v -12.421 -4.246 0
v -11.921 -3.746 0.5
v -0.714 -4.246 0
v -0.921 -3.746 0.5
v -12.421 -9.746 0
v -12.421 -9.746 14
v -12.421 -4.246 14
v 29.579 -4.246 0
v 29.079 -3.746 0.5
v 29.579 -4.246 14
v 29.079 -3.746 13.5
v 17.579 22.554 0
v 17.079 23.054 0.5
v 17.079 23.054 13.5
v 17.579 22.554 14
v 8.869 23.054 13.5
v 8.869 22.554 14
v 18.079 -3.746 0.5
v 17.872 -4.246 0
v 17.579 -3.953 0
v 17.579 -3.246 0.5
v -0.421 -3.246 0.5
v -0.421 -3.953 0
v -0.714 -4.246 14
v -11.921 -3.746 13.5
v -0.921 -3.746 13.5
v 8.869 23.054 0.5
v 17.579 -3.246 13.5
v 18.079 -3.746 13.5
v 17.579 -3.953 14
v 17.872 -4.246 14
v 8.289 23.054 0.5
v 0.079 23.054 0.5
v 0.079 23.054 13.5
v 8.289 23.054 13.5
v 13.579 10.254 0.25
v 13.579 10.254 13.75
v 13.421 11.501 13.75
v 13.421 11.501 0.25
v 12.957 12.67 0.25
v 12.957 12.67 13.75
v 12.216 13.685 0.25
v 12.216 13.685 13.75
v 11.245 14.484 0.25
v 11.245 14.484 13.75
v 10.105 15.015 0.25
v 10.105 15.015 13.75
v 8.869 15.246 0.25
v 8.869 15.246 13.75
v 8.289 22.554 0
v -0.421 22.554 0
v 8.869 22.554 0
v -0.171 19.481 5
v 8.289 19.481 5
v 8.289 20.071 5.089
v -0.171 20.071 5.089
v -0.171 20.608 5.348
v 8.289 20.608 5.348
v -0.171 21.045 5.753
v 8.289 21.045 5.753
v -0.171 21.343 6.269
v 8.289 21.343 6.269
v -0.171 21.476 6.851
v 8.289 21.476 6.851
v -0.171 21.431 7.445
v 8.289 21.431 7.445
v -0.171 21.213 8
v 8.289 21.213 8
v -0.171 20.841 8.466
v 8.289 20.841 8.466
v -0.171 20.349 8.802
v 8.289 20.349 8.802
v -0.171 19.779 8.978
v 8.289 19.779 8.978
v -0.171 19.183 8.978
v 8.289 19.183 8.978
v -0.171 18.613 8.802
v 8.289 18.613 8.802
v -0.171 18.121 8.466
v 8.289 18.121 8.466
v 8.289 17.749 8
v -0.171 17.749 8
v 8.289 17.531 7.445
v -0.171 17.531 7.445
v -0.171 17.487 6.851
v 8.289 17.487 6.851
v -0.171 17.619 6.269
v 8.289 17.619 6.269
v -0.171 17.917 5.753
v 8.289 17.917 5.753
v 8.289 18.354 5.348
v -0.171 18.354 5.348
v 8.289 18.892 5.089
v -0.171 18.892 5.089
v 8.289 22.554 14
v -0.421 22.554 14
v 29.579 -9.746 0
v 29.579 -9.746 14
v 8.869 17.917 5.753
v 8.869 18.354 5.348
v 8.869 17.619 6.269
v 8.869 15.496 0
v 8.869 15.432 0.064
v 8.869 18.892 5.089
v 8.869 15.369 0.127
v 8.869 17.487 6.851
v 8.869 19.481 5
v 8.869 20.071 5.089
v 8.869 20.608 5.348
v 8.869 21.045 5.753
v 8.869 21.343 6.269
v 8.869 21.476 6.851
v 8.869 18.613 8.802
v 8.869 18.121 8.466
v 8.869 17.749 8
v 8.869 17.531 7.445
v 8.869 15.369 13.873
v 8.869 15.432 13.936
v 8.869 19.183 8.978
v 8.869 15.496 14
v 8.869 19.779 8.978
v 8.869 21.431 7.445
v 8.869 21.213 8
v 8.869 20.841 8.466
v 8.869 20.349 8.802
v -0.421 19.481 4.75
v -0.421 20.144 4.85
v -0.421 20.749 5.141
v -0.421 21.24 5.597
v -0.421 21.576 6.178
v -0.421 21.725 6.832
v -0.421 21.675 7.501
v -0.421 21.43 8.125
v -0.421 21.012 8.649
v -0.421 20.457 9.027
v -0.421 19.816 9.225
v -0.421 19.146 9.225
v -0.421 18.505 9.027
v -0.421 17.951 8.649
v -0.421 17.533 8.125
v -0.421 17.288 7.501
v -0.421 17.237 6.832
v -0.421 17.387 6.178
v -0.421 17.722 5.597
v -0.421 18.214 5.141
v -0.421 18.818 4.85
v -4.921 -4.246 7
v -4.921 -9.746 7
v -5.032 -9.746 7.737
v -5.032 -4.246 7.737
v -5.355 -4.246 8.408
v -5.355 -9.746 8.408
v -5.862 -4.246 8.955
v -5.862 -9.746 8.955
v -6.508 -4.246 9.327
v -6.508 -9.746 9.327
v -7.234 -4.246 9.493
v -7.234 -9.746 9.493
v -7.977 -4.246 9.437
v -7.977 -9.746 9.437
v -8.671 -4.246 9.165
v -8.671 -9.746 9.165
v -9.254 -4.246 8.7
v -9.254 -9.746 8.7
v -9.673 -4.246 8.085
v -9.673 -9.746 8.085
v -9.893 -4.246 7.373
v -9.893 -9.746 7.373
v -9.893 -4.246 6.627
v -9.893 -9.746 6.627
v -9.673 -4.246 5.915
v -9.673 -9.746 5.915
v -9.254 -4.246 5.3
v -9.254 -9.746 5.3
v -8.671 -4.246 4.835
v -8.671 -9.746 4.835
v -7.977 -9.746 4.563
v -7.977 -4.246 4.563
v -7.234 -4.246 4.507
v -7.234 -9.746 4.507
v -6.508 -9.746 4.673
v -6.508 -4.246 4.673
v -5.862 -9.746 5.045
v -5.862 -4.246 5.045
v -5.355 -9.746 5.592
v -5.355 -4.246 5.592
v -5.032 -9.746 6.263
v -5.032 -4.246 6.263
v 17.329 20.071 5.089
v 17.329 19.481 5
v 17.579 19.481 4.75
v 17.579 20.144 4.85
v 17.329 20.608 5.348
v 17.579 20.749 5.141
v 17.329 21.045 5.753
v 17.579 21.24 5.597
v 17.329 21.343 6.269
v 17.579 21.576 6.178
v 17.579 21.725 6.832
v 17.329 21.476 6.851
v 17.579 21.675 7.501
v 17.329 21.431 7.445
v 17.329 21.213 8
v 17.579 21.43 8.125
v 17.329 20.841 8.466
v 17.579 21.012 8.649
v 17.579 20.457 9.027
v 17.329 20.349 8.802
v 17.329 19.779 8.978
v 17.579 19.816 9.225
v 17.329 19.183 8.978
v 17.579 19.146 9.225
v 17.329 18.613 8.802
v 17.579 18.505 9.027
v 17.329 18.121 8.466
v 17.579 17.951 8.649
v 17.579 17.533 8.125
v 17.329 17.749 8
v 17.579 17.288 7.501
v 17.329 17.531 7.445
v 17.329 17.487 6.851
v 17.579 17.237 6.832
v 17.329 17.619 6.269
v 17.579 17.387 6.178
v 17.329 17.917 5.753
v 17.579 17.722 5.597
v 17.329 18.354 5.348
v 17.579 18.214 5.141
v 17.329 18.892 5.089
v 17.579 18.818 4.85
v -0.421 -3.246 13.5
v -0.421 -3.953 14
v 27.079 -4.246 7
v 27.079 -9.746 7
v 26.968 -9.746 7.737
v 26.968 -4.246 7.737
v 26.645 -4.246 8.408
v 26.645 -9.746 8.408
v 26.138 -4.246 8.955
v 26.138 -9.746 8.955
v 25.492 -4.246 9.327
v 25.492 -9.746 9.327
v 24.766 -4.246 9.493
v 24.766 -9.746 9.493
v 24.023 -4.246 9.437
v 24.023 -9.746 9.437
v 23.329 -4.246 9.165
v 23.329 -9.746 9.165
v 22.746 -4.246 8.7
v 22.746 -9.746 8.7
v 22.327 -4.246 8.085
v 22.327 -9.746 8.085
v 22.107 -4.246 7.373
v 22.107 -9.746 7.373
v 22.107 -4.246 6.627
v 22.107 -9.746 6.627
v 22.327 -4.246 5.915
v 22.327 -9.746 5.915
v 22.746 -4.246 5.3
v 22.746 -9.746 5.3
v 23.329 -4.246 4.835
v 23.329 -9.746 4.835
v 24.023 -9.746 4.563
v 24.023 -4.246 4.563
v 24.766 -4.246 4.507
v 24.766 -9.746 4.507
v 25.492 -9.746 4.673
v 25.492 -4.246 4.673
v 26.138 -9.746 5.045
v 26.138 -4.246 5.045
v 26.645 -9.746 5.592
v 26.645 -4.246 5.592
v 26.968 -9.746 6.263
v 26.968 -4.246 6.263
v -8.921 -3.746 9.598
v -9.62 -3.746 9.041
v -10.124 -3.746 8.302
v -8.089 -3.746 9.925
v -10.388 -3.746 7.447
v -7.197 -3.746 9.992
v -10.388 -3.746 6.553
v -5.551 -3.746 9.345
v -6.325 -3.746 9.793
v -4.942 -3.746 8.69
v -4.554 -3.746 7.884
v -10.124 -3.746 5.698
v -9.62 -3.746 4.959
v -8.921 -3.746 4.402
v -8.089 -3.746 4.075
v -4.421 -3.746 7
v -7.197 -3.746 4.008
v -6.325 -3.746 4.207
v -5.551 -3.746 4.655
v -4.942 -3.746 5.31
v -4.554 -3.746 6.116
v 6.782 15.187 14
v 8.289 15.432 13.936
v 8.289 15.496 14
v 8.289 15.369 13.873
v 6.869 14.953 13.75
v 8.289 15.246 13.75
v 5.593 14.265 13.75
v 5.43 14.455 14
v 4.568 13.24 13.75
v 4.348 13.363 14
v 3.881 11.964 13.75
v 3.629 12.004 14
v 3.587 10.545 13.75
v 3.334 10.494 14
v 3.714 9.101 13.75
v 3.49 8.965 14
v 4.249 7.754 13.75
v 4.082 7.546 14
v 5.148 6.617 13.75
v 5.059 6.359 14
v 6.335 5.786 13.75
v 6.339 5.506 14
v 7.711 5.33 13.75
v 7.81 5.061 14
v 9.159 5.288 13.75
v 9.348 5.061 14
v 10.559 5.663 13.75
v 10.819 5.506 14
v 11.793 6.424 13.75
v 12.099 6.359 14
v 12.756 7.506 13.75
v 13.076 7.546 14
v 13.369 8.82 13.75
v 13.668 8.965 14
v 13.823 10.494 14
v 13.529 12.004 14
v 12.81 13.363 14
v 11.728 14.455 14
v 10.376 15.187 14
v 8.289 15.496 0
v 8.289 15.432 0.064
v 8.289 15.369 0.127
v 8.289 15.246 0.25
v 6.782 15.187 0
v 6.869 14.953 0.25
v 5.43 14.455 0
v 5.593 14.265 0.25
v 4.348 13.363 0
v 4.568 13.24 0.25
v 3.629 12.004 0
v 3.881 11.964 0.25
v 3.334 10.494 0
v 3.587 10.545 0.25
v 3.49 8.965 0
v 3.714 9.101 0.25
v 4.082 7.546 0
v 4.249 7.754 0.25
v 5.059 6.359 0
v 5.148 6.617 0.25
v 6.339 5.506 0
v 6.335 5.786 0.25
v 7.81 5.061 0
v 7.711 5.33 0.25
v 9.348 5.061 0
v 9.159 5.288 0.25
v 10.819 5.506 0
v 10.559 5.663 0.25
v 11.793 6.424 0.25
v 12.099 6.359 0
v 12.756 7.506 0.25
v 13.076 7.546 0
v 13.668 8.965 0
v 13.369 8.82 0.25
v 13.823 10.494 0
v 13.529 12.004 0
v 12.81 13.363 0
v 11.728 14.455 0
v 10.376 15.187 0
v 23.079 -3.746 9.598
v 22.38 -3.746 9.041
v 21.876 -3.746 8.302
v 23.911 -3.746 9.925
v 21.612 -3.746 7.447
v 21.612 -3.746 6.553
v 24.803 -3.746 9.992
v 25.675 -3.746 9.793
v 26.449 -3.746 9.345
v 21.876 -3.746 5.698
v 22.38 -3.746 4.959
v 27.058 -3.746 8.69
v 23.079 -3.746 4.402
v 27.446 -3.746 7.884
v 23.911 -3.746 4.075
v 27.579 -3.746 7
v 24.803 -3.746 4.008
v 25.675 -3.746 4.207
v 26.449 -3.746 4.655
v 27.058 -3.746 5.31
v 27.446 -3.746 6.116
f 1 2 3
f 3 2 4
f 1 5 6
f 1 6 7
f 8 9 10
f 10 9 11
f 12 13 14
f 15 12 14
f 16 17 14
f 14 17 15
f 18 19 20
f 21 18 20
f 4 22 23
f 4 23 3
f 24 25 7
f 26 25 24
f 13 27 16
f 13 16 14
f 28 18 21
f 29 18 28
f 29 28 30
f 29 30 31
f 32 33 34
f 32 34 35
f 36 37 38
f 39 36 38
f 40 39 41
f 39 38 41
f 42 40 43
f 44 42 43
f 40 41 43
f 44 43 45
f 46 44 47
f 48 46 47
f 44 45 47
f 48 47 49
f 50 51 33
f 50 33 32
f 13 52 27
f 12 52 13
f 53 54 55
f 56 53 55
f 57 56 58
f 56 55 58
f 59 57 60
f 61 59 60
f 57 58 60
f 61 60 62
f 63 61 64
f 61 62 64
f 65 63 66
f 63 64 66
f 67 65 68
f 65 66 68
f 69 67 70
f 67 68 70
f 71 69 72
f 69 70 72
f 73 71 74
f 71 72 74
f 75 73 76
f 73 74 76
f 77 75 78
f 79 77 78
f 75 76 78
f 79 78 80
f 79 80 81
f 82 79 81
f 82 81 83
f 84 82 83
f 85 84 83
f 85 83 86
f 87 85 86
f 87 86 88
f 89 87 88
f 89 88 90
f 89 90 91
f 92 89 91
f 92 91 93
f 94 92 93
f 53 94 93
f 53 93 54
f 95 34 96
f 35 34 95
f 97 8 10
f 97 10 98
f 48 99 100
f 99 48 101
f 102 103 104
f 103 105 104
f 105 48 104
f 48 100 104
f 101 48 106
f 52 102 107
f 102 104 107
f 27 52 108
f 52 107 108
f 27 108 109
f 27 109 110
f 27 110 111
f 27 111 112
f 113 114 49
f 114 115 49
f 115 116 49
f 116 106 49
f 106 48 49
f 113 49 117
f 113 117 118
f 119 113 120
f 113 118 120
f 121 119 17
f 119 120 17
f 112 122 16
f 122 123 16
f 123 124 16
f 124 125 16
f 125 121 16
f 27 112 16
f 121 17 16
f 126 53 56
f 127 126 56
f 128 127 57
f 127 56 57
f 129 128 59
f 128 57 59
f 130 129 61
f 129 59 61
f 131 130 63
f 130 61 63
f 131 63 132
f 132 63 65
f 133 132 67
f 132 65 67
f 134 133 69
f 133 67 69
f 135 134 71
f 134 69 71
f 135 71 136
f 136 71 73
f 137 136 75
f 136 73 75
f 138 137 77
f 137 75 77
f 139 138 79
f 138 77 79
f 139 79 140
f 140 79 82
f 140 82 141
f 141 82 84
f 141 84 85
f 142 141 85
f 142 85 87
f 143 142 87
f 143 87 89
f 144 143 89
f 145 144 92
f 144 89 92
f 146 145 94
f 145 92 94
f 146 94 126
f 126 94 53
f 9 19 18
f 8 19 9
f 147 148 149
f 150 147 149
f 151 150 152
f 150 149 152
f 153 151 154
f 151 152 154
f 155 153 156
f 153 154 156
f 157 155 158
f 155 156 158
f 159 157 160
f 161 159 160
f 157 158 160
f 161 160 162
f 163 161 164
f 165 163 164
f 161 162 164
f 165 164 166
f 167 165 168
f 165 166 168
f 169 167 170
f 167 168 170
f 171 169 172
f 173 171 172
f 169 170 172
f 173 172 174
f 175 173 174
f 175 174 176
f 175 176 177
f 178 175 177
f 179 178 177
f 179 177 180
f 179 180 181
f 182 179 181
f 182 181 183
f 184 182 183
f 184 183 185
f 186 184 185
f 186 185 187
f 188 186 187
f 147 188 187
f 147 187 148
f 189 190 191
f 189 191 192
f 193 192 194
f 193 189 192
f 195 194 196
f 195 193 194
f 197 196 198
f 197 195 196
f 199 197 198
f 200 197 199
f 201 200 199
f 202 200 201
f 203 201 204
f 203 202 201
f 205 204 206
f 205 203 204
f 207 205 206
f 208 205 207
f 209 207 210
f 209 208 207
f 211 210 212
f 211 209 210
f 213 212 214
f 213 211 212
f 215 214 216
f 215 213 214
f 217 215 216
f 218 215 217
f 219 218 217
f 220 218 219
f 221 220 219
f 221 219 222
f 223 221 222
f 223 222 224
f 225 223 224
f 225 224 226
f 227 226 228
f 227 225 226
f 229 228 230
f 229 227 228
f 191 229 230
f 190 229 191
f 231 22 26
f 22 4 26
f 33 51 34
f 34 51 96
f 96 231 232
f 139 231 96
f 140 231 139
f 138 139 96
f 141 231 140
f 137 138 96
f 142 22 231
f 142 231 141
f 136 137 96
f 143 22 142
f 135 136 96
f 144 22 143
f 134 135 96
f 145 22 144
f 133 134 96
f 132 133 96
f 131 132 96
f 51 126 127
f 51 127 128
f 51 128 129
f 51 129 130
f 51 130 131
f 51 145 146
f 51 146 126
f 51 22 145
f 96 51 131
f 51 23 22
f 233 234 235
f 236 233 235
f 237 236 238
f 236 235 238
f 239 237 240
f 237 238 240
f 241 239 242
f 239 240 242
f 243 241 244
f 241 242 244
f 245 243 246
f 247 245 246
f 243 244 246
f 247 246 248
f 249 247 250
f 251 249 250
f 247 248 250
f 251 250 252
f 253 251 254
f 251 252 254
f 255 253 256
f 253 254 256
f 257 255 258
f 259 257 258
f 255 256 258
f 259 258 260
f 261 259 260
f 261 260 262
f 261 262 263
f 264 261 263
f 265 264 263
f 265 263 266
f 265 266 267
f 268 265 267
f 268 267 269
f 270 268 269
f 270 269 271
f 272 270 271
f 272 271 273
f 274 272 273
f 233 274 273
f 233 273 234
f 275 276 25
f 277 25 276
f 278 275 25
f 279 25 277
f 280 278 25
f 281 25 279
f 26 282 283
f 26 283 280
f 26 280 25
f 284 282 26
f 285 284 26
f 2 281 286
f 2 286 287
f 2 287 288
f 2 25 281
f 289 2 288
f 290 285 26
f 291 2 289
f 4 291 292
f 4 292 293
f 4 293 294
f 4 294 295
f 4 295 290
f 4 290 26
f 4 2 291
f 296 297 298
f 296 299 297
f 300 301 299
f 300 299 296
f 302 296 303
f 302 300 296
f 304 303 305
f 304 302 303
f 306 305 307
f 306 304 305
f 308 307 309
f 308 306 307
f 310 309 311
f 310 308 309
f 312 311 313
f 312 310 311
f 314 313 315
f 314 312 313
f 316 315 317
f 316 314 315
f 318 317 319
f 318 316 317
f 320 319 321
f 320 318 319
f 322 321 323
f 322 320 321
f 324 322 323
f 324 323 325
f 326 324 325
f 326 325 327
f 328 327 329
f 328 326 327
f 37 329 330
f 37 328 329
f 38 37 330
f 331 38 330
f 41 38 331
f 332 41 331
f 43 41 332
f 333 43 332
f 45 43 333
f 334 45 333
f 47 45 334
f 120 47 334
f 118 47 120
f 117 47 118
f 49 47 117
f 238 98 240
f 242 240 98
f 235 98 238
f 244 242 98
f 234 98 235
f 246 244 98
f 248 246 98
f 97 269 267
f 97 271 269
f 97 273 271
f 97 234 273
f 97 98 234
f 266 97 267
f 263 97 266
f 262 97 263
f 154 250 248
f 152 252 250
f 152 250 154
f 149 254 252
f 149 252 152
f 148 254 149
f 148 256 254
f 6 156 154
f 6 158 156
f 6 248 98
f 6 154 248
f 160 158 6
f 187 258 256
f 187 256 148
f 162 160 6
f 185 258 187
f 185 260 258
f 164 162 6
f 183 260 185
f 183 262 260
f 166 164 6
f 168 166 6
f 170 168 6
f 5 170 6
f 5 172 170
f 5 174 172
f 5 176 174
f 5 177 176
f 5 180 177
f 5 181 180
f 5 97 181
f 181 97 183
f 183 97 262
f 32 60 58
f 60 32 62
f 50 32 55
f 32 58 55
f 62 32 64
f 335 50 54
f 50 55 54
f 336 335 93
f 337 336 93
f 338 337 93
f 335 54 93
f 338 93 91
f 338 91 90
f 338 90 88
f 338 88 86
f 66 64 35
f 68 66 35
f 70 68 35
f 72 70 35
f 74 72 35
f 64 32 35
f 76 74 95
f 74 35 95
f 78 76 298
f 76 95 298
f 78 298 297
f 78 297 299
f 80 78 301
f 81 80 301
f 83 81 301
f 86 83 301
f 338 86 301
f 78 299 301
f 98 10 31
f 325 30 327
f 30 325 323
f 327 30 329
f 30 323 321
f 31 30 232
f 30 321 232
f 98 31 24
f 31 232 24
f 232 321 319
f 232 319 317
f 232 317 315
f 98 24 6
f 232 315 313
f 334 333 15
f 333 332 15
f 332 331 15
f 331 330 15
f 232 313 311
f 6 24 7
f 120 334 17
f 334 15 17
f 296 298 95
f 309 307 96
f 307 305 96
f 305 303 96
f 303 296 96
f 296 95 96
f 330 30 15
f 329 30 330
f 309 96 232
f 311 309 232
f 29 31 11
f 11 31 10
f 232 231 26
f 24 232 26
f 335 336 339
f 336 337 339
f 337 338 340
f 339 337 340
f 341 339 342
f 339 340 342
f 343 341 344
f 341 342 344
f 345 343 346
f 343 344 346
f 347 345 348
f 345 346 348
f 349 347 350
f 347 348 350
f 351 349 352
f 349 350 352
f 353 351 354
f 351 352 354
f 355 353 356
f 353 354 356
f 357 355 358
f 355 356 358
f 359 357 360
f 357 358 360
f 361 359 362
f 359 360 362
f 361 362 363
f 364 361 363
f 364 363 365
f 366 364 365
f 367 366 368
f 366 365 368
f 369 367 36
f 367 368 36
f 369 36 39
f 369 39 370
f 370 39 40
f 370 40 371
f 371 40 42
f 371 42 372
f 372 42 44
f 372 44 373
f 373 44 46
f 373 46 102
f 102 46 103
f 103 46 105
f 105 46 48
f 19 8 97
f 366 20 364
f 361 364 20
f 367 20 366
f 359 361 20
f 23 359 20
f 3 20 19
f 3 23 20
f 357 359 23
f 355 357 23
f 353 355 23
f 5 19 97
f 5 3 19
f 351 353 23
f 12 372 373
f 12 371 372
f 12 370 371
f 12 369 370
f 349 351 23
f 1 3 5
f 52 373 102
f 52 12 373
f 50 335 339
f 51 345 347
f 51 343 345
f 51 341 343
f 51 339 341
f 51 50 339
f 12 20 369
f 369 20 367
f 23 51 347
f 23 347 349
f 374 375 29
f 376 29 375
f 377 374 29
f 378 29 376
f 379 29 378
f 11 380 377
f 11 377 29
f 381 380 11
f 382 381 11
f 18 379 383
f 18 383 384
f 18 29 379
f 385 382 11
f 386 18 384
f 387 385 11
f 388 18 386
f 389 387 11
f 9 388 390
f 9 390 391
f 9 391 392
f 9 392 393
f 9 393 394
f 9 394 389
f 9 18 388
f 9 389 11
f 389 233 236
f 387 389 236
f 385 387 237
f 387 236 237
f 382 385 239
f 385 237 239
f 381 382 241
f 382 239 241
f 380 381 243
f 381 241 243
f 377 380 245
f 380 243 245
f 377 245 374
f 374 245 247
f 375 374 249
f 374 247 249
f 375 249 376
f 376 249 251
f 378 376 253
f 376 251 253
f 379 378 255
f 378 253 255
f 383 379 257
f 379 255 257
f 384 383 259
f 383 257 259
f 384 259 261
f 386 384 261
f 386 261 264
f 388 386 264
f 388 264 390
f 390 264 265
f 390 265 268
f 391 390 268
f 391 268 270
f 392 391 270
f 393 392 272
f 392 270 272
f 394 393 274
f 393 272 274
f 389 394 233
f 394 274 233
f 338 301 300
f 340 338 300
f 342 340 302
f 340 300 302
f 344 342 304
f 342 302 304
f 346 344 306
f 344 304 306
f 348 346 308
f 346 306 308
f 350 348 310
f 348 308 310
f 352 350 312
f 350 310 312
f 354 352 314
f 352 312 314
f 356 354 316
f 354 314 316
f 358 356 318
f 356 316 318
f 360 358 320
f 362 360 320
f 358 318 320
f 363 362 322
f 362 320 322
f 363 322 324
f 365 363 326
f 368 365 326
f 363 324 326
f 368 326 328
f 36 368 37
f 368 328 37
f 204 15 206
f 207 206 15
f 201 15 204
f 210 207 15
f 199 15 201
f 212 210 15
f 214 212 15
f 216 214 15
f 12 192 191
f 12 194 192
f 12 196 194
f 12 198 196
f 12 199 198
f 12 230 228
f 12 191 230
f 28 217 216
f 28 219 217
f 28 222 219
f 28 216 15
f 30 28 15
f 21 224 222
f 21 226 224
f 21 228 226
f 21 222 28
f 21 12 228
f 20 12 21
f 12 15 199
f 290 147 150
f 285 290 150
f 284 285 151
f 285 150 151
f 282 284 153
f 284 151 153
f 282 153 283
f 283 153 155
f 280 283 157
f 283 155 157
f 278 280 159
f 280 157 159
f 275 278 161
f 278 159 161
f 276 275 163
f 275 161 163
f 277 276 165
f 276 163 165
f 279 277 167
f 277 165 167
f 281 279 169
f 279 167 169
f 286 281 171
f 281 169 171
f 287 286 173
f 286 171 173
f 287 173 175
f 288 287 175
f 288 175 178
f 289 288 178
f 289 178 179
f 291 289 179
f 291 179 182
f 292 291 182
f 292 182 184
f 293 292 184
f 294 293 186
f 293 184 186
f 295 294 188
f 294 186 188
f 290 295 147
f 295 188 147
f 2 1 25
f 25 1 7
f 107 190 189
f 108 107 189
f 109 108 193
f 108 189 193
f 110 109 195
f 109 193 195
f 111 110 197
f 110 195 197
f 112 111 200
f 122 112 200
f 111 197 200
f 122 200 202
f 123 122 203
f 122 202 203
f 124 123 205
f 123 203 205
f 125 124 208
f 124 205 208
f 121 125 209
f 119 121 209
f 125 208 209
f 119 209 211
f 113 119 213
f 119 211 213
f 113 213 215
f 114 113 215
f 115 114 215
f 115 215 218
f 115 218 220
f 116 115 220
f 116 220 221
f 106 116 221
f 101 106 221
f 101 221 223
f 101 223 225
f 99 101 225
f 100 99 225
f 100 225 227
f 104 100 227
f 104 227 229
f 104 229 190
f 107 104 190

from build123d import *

# Parameters (mm, degrees)
BOSS_EXTRUDE1_DEPTH = 14
CHAMFER1_SIZE       = 0.5
CHAMFER2_SIZE       = 0.5
CHAMFER3_SIZE       = 0.5
CHAMFER4_SIZE       = 0.5
CHAMFER5_SIZE       = 0.5
CHAMFER6_SIZE       = 0.5
SKETCH2_R           = 5
CUT_EXTRUDE2_DEPTH  = 14
CUT_EXTRUDE3_DEPTH  = 14
SKETCH4_R           = 2
CUT_EXTRUDE4_DEPTH  = 25
SKETCH5_R           = 2.5
CUT_EXTRUDE5_DEPTH  = 25
CHAMFER7_SIZE       = 0.5
CHAMFER8_SIZE       = 0.5
CHAMFER9_SIZE       = 0.5
CHAMFER10_SIZE      = 0.5
CHAMFER11_SIZE      = 0.5
CHAMFER12_SIZE      = 0.5
CHAMFER13_SIZE      = 0.5
CHAMFER14_SIZE      = 0.5
CHAMFER15_SIZE      = 0.5
CHAMFER16_SIZE      = 0.25
CHAMFER17_SIZE      = 0.25
CHAMFER18_SIZE      = 0.25


with BuildPart() as part:
    # Sketch1 → Boss-Extrude1 (new body)
    with BuildSketch(Plane.XY):
        Polygon((-0.421052632, -3.746003341), (-0.421052632, 23.053996659), (17.578947368, 23.053996659), (17.578947368, -3.746003341), (29.578947368, -3.746003341), (29.578947368, -9.746003341), (-12.421052632, -9.746003341), (-12.421052632, -3.746003341), align=None)
    extrude(amount=BOSS_EXTRUDE1_DEPTH)

    # Chamfer1
    chamfer1_edges = [part.edges().sort_by_distance(p)[0] for p in [
        (17.578947368, -3.746003341, 7),
    ]]
    chamfer(chamfer1_edges, length=CHAMFER1_SIZE)

    # Chamfer2
    chamfer2_edges = [part.edges().sort_by_distance(p)[0] for p in [
        (-0.421052632, -3.746003341, 7),
    ]]
    chamfer(chamfer2_edges, length=CHAMFER2_SIZE)

    # Chamfer3
    chamfer3_edges = [part.edges().sort_by_distance(p)[0] for p in [
        (-12.421052632, -3.746003341, 7),
    ]]
    chamfer(chamfer3_edges, length=CHAMFER3_SIZE)

    # Chamfer4
    chamfer4_edges = [part.edges().sort_by_distance(p)[0] for p in [
        (29.578947368, -3.746003341, 7),
    ]]
    chamfer(chamfer4_edges, length=CHAMFER4_SIZE)

    # Chamfer5
    chamfer5_edges = [part.edges().sort_by_distance(p)[0] for p in [
        (17.578947368, 23.053996659, 7),
    ]]
    chamfer(chamfer5_edges, length=CHAMFER5_SIZE)

    # Chamfer6
    chamfer6_edges = [part.edges().sort_by_distance(p)[0] for p in [
        (-0.421052632, 23.053996659, 7),
    ]]
    chamfer(chamfer6_edges, length=CHAMFER6_SIZE)

    # Sketch2 → Cut-Extrude2 (cut)
    with BuildSketch(Plane.XY.offset(14)):
        with Locations((8.578947368, 10.253996659)):
            Circle(SKETCH2_R)
    extrude(amount=-CUT_EXTRUDE2_DEPTH, mode=Mode.SUBTRACT)

    # Sketch3 → Cut-Extrude3 (cut)
    with BuildSketch(Plane.XY.offset(14)):
        Polygon((8.288550375, 23.332002233), (8.288550375, 14.543053955), (8.869344362, 14.973079178), (8.869344362, 23.332002233), align=None)
    extrude(amount=-CUT_EXTRUDE3_DEPTH, mode=Mode.SUBTRACT)

    # Sketch4 → Cut-Extrude4 (cut)
    with BuildSketch(Plane(origin=(17.578947368, 0, 0), x_dir=(0, 0, -1), z_dir=(1, 0, 0))):
        with Locations((-7, 19.481136132)):
            Circle(SKETCH4_R)
    extrude(amount=-CUT_EXTRUDE4_DEPTH, mode=Mode.SUBTRACT)

    # Sketch5 → Cut-Extrude5 (cut)
    with BuildSketch(Plane.XZ.offset(9.746003341)):
        with Locations((-7.421052632, 7)):
            Circle(SKETCH5_R)
        with Locations((24.578947368, 7)):
            Circle(SKETCH5_R)
    extrude(amount=-CUT_EXTRUDE5_DEPTH, mode=Mode.SUBTRACT)

    # Chamfer7
    chamfer7_edges = [part.edges().sort_by_distance(p)[0] for p in [
        (-9.921052632, -3.746003341, 7),
    ]]
    chamfer(chamfer7_edges, length=CHAMFER7_SIZE)

    # Chamfer8
    chamfer8_edges = [part.edges().sort_by_distance(p)[0] for p in [
        (22.078947368, -3.746003341, 7),
    ]]
    chamfer(chamfer8_edges, length=CHAMFER8_SIZE)

    # Chamfer9
    chamfer9_edges = [part.edges().sort_by_distance(p)[0] for p in [
        (23.578947368, -3.746003341, 14),
    ]]
    chamfer(chamfer9_edges, length=CHAMFER9_SIZE)

    # Chamfer10
    chamfer10_edges = [part.edges().sort_by_distance(p)[0] for p in [
        (18.328947368, -3.996003341, 14),
    ]]
    chamfer(chamfer10_edges, length=CHAMFER10_SIZE)

    # Chamfer11
    chamfer11_edges = [part.edges().sort_by_distance(p)[0] for p in [
        (23.578947368, -3.746003341, 0),
    ]]
    chamfer(chamfer11_edges, length=CHAMFER11_SIZE)

    # Chamfer12
    chamfer12_edges = [part.edges().sort_by_distance(p)[0] for p in [
        (18.328947368, -3.996003341, 0),
    ]]
    chamfer(chamfer12_edges, length=CHAMFER12_SIZE)

    # Chamfer13
    chamfer13_edges = [part.edges().sort_by_distance(p)[0] for p in [
        (4.183748872, 23.053996659, 0),
        (12.974145865, 23.053996659, 0),
    ]]
    chamfer(chamfer13_edges, length=CHAMFER13_SIZE)

    # Chamfer14
    chamfer14_edges = [part.edges().sort_by_distance(p)[0] for p in [
        (12.974145865, 23.053996659, 14),
        (4.183748872, 23.053996659, 14),
    ]]
    chamfer(chamfer14_edges, length=CHAMFER14_SIZE)

    # Chamfer15
    chamfer15_edges = [part.edges().sort_by_distance(p)[0] for p in [
        (-0.671052632, -3.496003341, 0),
        (-6.421052632, -3.746003341, 0),
        (-0.671052632, -3.496003341, 14),
        (-6.421052632, -3.746003341, 14),
    ]]
    chamfer(chamfer15_edges, length=CHAMFER15_SIZE)

    # Chamfer16
    chamfer16_edges = [part.edges().sort_by_distance(p)[0] for p in [
        (5.147619999, 6.617240896, 0),
        (5.147619999, 6.617240896, 14),
    ]]
    chamfer(chamfer16_edges, length=CHAMFER16_SIZE)

    # Chamfer17
    chamfer17_edges = [part.edges().sort_by_distance(p)[0] for p in [
        (-0.421052632, 19.481136132, 9),
    ]]
    chamfer(chamfer17_edges, length=CHAMFER17_SIZE)

    # Chamfer18
    chamfer18_edges = [part.edges().sort_by_distance(p)[0] for p in [
        (17.578947368, 19.481136132, 9),
    ]]
    chamfer(chamfer18_edges, length=CHAMFER18_SIZE)


solid = part.part
